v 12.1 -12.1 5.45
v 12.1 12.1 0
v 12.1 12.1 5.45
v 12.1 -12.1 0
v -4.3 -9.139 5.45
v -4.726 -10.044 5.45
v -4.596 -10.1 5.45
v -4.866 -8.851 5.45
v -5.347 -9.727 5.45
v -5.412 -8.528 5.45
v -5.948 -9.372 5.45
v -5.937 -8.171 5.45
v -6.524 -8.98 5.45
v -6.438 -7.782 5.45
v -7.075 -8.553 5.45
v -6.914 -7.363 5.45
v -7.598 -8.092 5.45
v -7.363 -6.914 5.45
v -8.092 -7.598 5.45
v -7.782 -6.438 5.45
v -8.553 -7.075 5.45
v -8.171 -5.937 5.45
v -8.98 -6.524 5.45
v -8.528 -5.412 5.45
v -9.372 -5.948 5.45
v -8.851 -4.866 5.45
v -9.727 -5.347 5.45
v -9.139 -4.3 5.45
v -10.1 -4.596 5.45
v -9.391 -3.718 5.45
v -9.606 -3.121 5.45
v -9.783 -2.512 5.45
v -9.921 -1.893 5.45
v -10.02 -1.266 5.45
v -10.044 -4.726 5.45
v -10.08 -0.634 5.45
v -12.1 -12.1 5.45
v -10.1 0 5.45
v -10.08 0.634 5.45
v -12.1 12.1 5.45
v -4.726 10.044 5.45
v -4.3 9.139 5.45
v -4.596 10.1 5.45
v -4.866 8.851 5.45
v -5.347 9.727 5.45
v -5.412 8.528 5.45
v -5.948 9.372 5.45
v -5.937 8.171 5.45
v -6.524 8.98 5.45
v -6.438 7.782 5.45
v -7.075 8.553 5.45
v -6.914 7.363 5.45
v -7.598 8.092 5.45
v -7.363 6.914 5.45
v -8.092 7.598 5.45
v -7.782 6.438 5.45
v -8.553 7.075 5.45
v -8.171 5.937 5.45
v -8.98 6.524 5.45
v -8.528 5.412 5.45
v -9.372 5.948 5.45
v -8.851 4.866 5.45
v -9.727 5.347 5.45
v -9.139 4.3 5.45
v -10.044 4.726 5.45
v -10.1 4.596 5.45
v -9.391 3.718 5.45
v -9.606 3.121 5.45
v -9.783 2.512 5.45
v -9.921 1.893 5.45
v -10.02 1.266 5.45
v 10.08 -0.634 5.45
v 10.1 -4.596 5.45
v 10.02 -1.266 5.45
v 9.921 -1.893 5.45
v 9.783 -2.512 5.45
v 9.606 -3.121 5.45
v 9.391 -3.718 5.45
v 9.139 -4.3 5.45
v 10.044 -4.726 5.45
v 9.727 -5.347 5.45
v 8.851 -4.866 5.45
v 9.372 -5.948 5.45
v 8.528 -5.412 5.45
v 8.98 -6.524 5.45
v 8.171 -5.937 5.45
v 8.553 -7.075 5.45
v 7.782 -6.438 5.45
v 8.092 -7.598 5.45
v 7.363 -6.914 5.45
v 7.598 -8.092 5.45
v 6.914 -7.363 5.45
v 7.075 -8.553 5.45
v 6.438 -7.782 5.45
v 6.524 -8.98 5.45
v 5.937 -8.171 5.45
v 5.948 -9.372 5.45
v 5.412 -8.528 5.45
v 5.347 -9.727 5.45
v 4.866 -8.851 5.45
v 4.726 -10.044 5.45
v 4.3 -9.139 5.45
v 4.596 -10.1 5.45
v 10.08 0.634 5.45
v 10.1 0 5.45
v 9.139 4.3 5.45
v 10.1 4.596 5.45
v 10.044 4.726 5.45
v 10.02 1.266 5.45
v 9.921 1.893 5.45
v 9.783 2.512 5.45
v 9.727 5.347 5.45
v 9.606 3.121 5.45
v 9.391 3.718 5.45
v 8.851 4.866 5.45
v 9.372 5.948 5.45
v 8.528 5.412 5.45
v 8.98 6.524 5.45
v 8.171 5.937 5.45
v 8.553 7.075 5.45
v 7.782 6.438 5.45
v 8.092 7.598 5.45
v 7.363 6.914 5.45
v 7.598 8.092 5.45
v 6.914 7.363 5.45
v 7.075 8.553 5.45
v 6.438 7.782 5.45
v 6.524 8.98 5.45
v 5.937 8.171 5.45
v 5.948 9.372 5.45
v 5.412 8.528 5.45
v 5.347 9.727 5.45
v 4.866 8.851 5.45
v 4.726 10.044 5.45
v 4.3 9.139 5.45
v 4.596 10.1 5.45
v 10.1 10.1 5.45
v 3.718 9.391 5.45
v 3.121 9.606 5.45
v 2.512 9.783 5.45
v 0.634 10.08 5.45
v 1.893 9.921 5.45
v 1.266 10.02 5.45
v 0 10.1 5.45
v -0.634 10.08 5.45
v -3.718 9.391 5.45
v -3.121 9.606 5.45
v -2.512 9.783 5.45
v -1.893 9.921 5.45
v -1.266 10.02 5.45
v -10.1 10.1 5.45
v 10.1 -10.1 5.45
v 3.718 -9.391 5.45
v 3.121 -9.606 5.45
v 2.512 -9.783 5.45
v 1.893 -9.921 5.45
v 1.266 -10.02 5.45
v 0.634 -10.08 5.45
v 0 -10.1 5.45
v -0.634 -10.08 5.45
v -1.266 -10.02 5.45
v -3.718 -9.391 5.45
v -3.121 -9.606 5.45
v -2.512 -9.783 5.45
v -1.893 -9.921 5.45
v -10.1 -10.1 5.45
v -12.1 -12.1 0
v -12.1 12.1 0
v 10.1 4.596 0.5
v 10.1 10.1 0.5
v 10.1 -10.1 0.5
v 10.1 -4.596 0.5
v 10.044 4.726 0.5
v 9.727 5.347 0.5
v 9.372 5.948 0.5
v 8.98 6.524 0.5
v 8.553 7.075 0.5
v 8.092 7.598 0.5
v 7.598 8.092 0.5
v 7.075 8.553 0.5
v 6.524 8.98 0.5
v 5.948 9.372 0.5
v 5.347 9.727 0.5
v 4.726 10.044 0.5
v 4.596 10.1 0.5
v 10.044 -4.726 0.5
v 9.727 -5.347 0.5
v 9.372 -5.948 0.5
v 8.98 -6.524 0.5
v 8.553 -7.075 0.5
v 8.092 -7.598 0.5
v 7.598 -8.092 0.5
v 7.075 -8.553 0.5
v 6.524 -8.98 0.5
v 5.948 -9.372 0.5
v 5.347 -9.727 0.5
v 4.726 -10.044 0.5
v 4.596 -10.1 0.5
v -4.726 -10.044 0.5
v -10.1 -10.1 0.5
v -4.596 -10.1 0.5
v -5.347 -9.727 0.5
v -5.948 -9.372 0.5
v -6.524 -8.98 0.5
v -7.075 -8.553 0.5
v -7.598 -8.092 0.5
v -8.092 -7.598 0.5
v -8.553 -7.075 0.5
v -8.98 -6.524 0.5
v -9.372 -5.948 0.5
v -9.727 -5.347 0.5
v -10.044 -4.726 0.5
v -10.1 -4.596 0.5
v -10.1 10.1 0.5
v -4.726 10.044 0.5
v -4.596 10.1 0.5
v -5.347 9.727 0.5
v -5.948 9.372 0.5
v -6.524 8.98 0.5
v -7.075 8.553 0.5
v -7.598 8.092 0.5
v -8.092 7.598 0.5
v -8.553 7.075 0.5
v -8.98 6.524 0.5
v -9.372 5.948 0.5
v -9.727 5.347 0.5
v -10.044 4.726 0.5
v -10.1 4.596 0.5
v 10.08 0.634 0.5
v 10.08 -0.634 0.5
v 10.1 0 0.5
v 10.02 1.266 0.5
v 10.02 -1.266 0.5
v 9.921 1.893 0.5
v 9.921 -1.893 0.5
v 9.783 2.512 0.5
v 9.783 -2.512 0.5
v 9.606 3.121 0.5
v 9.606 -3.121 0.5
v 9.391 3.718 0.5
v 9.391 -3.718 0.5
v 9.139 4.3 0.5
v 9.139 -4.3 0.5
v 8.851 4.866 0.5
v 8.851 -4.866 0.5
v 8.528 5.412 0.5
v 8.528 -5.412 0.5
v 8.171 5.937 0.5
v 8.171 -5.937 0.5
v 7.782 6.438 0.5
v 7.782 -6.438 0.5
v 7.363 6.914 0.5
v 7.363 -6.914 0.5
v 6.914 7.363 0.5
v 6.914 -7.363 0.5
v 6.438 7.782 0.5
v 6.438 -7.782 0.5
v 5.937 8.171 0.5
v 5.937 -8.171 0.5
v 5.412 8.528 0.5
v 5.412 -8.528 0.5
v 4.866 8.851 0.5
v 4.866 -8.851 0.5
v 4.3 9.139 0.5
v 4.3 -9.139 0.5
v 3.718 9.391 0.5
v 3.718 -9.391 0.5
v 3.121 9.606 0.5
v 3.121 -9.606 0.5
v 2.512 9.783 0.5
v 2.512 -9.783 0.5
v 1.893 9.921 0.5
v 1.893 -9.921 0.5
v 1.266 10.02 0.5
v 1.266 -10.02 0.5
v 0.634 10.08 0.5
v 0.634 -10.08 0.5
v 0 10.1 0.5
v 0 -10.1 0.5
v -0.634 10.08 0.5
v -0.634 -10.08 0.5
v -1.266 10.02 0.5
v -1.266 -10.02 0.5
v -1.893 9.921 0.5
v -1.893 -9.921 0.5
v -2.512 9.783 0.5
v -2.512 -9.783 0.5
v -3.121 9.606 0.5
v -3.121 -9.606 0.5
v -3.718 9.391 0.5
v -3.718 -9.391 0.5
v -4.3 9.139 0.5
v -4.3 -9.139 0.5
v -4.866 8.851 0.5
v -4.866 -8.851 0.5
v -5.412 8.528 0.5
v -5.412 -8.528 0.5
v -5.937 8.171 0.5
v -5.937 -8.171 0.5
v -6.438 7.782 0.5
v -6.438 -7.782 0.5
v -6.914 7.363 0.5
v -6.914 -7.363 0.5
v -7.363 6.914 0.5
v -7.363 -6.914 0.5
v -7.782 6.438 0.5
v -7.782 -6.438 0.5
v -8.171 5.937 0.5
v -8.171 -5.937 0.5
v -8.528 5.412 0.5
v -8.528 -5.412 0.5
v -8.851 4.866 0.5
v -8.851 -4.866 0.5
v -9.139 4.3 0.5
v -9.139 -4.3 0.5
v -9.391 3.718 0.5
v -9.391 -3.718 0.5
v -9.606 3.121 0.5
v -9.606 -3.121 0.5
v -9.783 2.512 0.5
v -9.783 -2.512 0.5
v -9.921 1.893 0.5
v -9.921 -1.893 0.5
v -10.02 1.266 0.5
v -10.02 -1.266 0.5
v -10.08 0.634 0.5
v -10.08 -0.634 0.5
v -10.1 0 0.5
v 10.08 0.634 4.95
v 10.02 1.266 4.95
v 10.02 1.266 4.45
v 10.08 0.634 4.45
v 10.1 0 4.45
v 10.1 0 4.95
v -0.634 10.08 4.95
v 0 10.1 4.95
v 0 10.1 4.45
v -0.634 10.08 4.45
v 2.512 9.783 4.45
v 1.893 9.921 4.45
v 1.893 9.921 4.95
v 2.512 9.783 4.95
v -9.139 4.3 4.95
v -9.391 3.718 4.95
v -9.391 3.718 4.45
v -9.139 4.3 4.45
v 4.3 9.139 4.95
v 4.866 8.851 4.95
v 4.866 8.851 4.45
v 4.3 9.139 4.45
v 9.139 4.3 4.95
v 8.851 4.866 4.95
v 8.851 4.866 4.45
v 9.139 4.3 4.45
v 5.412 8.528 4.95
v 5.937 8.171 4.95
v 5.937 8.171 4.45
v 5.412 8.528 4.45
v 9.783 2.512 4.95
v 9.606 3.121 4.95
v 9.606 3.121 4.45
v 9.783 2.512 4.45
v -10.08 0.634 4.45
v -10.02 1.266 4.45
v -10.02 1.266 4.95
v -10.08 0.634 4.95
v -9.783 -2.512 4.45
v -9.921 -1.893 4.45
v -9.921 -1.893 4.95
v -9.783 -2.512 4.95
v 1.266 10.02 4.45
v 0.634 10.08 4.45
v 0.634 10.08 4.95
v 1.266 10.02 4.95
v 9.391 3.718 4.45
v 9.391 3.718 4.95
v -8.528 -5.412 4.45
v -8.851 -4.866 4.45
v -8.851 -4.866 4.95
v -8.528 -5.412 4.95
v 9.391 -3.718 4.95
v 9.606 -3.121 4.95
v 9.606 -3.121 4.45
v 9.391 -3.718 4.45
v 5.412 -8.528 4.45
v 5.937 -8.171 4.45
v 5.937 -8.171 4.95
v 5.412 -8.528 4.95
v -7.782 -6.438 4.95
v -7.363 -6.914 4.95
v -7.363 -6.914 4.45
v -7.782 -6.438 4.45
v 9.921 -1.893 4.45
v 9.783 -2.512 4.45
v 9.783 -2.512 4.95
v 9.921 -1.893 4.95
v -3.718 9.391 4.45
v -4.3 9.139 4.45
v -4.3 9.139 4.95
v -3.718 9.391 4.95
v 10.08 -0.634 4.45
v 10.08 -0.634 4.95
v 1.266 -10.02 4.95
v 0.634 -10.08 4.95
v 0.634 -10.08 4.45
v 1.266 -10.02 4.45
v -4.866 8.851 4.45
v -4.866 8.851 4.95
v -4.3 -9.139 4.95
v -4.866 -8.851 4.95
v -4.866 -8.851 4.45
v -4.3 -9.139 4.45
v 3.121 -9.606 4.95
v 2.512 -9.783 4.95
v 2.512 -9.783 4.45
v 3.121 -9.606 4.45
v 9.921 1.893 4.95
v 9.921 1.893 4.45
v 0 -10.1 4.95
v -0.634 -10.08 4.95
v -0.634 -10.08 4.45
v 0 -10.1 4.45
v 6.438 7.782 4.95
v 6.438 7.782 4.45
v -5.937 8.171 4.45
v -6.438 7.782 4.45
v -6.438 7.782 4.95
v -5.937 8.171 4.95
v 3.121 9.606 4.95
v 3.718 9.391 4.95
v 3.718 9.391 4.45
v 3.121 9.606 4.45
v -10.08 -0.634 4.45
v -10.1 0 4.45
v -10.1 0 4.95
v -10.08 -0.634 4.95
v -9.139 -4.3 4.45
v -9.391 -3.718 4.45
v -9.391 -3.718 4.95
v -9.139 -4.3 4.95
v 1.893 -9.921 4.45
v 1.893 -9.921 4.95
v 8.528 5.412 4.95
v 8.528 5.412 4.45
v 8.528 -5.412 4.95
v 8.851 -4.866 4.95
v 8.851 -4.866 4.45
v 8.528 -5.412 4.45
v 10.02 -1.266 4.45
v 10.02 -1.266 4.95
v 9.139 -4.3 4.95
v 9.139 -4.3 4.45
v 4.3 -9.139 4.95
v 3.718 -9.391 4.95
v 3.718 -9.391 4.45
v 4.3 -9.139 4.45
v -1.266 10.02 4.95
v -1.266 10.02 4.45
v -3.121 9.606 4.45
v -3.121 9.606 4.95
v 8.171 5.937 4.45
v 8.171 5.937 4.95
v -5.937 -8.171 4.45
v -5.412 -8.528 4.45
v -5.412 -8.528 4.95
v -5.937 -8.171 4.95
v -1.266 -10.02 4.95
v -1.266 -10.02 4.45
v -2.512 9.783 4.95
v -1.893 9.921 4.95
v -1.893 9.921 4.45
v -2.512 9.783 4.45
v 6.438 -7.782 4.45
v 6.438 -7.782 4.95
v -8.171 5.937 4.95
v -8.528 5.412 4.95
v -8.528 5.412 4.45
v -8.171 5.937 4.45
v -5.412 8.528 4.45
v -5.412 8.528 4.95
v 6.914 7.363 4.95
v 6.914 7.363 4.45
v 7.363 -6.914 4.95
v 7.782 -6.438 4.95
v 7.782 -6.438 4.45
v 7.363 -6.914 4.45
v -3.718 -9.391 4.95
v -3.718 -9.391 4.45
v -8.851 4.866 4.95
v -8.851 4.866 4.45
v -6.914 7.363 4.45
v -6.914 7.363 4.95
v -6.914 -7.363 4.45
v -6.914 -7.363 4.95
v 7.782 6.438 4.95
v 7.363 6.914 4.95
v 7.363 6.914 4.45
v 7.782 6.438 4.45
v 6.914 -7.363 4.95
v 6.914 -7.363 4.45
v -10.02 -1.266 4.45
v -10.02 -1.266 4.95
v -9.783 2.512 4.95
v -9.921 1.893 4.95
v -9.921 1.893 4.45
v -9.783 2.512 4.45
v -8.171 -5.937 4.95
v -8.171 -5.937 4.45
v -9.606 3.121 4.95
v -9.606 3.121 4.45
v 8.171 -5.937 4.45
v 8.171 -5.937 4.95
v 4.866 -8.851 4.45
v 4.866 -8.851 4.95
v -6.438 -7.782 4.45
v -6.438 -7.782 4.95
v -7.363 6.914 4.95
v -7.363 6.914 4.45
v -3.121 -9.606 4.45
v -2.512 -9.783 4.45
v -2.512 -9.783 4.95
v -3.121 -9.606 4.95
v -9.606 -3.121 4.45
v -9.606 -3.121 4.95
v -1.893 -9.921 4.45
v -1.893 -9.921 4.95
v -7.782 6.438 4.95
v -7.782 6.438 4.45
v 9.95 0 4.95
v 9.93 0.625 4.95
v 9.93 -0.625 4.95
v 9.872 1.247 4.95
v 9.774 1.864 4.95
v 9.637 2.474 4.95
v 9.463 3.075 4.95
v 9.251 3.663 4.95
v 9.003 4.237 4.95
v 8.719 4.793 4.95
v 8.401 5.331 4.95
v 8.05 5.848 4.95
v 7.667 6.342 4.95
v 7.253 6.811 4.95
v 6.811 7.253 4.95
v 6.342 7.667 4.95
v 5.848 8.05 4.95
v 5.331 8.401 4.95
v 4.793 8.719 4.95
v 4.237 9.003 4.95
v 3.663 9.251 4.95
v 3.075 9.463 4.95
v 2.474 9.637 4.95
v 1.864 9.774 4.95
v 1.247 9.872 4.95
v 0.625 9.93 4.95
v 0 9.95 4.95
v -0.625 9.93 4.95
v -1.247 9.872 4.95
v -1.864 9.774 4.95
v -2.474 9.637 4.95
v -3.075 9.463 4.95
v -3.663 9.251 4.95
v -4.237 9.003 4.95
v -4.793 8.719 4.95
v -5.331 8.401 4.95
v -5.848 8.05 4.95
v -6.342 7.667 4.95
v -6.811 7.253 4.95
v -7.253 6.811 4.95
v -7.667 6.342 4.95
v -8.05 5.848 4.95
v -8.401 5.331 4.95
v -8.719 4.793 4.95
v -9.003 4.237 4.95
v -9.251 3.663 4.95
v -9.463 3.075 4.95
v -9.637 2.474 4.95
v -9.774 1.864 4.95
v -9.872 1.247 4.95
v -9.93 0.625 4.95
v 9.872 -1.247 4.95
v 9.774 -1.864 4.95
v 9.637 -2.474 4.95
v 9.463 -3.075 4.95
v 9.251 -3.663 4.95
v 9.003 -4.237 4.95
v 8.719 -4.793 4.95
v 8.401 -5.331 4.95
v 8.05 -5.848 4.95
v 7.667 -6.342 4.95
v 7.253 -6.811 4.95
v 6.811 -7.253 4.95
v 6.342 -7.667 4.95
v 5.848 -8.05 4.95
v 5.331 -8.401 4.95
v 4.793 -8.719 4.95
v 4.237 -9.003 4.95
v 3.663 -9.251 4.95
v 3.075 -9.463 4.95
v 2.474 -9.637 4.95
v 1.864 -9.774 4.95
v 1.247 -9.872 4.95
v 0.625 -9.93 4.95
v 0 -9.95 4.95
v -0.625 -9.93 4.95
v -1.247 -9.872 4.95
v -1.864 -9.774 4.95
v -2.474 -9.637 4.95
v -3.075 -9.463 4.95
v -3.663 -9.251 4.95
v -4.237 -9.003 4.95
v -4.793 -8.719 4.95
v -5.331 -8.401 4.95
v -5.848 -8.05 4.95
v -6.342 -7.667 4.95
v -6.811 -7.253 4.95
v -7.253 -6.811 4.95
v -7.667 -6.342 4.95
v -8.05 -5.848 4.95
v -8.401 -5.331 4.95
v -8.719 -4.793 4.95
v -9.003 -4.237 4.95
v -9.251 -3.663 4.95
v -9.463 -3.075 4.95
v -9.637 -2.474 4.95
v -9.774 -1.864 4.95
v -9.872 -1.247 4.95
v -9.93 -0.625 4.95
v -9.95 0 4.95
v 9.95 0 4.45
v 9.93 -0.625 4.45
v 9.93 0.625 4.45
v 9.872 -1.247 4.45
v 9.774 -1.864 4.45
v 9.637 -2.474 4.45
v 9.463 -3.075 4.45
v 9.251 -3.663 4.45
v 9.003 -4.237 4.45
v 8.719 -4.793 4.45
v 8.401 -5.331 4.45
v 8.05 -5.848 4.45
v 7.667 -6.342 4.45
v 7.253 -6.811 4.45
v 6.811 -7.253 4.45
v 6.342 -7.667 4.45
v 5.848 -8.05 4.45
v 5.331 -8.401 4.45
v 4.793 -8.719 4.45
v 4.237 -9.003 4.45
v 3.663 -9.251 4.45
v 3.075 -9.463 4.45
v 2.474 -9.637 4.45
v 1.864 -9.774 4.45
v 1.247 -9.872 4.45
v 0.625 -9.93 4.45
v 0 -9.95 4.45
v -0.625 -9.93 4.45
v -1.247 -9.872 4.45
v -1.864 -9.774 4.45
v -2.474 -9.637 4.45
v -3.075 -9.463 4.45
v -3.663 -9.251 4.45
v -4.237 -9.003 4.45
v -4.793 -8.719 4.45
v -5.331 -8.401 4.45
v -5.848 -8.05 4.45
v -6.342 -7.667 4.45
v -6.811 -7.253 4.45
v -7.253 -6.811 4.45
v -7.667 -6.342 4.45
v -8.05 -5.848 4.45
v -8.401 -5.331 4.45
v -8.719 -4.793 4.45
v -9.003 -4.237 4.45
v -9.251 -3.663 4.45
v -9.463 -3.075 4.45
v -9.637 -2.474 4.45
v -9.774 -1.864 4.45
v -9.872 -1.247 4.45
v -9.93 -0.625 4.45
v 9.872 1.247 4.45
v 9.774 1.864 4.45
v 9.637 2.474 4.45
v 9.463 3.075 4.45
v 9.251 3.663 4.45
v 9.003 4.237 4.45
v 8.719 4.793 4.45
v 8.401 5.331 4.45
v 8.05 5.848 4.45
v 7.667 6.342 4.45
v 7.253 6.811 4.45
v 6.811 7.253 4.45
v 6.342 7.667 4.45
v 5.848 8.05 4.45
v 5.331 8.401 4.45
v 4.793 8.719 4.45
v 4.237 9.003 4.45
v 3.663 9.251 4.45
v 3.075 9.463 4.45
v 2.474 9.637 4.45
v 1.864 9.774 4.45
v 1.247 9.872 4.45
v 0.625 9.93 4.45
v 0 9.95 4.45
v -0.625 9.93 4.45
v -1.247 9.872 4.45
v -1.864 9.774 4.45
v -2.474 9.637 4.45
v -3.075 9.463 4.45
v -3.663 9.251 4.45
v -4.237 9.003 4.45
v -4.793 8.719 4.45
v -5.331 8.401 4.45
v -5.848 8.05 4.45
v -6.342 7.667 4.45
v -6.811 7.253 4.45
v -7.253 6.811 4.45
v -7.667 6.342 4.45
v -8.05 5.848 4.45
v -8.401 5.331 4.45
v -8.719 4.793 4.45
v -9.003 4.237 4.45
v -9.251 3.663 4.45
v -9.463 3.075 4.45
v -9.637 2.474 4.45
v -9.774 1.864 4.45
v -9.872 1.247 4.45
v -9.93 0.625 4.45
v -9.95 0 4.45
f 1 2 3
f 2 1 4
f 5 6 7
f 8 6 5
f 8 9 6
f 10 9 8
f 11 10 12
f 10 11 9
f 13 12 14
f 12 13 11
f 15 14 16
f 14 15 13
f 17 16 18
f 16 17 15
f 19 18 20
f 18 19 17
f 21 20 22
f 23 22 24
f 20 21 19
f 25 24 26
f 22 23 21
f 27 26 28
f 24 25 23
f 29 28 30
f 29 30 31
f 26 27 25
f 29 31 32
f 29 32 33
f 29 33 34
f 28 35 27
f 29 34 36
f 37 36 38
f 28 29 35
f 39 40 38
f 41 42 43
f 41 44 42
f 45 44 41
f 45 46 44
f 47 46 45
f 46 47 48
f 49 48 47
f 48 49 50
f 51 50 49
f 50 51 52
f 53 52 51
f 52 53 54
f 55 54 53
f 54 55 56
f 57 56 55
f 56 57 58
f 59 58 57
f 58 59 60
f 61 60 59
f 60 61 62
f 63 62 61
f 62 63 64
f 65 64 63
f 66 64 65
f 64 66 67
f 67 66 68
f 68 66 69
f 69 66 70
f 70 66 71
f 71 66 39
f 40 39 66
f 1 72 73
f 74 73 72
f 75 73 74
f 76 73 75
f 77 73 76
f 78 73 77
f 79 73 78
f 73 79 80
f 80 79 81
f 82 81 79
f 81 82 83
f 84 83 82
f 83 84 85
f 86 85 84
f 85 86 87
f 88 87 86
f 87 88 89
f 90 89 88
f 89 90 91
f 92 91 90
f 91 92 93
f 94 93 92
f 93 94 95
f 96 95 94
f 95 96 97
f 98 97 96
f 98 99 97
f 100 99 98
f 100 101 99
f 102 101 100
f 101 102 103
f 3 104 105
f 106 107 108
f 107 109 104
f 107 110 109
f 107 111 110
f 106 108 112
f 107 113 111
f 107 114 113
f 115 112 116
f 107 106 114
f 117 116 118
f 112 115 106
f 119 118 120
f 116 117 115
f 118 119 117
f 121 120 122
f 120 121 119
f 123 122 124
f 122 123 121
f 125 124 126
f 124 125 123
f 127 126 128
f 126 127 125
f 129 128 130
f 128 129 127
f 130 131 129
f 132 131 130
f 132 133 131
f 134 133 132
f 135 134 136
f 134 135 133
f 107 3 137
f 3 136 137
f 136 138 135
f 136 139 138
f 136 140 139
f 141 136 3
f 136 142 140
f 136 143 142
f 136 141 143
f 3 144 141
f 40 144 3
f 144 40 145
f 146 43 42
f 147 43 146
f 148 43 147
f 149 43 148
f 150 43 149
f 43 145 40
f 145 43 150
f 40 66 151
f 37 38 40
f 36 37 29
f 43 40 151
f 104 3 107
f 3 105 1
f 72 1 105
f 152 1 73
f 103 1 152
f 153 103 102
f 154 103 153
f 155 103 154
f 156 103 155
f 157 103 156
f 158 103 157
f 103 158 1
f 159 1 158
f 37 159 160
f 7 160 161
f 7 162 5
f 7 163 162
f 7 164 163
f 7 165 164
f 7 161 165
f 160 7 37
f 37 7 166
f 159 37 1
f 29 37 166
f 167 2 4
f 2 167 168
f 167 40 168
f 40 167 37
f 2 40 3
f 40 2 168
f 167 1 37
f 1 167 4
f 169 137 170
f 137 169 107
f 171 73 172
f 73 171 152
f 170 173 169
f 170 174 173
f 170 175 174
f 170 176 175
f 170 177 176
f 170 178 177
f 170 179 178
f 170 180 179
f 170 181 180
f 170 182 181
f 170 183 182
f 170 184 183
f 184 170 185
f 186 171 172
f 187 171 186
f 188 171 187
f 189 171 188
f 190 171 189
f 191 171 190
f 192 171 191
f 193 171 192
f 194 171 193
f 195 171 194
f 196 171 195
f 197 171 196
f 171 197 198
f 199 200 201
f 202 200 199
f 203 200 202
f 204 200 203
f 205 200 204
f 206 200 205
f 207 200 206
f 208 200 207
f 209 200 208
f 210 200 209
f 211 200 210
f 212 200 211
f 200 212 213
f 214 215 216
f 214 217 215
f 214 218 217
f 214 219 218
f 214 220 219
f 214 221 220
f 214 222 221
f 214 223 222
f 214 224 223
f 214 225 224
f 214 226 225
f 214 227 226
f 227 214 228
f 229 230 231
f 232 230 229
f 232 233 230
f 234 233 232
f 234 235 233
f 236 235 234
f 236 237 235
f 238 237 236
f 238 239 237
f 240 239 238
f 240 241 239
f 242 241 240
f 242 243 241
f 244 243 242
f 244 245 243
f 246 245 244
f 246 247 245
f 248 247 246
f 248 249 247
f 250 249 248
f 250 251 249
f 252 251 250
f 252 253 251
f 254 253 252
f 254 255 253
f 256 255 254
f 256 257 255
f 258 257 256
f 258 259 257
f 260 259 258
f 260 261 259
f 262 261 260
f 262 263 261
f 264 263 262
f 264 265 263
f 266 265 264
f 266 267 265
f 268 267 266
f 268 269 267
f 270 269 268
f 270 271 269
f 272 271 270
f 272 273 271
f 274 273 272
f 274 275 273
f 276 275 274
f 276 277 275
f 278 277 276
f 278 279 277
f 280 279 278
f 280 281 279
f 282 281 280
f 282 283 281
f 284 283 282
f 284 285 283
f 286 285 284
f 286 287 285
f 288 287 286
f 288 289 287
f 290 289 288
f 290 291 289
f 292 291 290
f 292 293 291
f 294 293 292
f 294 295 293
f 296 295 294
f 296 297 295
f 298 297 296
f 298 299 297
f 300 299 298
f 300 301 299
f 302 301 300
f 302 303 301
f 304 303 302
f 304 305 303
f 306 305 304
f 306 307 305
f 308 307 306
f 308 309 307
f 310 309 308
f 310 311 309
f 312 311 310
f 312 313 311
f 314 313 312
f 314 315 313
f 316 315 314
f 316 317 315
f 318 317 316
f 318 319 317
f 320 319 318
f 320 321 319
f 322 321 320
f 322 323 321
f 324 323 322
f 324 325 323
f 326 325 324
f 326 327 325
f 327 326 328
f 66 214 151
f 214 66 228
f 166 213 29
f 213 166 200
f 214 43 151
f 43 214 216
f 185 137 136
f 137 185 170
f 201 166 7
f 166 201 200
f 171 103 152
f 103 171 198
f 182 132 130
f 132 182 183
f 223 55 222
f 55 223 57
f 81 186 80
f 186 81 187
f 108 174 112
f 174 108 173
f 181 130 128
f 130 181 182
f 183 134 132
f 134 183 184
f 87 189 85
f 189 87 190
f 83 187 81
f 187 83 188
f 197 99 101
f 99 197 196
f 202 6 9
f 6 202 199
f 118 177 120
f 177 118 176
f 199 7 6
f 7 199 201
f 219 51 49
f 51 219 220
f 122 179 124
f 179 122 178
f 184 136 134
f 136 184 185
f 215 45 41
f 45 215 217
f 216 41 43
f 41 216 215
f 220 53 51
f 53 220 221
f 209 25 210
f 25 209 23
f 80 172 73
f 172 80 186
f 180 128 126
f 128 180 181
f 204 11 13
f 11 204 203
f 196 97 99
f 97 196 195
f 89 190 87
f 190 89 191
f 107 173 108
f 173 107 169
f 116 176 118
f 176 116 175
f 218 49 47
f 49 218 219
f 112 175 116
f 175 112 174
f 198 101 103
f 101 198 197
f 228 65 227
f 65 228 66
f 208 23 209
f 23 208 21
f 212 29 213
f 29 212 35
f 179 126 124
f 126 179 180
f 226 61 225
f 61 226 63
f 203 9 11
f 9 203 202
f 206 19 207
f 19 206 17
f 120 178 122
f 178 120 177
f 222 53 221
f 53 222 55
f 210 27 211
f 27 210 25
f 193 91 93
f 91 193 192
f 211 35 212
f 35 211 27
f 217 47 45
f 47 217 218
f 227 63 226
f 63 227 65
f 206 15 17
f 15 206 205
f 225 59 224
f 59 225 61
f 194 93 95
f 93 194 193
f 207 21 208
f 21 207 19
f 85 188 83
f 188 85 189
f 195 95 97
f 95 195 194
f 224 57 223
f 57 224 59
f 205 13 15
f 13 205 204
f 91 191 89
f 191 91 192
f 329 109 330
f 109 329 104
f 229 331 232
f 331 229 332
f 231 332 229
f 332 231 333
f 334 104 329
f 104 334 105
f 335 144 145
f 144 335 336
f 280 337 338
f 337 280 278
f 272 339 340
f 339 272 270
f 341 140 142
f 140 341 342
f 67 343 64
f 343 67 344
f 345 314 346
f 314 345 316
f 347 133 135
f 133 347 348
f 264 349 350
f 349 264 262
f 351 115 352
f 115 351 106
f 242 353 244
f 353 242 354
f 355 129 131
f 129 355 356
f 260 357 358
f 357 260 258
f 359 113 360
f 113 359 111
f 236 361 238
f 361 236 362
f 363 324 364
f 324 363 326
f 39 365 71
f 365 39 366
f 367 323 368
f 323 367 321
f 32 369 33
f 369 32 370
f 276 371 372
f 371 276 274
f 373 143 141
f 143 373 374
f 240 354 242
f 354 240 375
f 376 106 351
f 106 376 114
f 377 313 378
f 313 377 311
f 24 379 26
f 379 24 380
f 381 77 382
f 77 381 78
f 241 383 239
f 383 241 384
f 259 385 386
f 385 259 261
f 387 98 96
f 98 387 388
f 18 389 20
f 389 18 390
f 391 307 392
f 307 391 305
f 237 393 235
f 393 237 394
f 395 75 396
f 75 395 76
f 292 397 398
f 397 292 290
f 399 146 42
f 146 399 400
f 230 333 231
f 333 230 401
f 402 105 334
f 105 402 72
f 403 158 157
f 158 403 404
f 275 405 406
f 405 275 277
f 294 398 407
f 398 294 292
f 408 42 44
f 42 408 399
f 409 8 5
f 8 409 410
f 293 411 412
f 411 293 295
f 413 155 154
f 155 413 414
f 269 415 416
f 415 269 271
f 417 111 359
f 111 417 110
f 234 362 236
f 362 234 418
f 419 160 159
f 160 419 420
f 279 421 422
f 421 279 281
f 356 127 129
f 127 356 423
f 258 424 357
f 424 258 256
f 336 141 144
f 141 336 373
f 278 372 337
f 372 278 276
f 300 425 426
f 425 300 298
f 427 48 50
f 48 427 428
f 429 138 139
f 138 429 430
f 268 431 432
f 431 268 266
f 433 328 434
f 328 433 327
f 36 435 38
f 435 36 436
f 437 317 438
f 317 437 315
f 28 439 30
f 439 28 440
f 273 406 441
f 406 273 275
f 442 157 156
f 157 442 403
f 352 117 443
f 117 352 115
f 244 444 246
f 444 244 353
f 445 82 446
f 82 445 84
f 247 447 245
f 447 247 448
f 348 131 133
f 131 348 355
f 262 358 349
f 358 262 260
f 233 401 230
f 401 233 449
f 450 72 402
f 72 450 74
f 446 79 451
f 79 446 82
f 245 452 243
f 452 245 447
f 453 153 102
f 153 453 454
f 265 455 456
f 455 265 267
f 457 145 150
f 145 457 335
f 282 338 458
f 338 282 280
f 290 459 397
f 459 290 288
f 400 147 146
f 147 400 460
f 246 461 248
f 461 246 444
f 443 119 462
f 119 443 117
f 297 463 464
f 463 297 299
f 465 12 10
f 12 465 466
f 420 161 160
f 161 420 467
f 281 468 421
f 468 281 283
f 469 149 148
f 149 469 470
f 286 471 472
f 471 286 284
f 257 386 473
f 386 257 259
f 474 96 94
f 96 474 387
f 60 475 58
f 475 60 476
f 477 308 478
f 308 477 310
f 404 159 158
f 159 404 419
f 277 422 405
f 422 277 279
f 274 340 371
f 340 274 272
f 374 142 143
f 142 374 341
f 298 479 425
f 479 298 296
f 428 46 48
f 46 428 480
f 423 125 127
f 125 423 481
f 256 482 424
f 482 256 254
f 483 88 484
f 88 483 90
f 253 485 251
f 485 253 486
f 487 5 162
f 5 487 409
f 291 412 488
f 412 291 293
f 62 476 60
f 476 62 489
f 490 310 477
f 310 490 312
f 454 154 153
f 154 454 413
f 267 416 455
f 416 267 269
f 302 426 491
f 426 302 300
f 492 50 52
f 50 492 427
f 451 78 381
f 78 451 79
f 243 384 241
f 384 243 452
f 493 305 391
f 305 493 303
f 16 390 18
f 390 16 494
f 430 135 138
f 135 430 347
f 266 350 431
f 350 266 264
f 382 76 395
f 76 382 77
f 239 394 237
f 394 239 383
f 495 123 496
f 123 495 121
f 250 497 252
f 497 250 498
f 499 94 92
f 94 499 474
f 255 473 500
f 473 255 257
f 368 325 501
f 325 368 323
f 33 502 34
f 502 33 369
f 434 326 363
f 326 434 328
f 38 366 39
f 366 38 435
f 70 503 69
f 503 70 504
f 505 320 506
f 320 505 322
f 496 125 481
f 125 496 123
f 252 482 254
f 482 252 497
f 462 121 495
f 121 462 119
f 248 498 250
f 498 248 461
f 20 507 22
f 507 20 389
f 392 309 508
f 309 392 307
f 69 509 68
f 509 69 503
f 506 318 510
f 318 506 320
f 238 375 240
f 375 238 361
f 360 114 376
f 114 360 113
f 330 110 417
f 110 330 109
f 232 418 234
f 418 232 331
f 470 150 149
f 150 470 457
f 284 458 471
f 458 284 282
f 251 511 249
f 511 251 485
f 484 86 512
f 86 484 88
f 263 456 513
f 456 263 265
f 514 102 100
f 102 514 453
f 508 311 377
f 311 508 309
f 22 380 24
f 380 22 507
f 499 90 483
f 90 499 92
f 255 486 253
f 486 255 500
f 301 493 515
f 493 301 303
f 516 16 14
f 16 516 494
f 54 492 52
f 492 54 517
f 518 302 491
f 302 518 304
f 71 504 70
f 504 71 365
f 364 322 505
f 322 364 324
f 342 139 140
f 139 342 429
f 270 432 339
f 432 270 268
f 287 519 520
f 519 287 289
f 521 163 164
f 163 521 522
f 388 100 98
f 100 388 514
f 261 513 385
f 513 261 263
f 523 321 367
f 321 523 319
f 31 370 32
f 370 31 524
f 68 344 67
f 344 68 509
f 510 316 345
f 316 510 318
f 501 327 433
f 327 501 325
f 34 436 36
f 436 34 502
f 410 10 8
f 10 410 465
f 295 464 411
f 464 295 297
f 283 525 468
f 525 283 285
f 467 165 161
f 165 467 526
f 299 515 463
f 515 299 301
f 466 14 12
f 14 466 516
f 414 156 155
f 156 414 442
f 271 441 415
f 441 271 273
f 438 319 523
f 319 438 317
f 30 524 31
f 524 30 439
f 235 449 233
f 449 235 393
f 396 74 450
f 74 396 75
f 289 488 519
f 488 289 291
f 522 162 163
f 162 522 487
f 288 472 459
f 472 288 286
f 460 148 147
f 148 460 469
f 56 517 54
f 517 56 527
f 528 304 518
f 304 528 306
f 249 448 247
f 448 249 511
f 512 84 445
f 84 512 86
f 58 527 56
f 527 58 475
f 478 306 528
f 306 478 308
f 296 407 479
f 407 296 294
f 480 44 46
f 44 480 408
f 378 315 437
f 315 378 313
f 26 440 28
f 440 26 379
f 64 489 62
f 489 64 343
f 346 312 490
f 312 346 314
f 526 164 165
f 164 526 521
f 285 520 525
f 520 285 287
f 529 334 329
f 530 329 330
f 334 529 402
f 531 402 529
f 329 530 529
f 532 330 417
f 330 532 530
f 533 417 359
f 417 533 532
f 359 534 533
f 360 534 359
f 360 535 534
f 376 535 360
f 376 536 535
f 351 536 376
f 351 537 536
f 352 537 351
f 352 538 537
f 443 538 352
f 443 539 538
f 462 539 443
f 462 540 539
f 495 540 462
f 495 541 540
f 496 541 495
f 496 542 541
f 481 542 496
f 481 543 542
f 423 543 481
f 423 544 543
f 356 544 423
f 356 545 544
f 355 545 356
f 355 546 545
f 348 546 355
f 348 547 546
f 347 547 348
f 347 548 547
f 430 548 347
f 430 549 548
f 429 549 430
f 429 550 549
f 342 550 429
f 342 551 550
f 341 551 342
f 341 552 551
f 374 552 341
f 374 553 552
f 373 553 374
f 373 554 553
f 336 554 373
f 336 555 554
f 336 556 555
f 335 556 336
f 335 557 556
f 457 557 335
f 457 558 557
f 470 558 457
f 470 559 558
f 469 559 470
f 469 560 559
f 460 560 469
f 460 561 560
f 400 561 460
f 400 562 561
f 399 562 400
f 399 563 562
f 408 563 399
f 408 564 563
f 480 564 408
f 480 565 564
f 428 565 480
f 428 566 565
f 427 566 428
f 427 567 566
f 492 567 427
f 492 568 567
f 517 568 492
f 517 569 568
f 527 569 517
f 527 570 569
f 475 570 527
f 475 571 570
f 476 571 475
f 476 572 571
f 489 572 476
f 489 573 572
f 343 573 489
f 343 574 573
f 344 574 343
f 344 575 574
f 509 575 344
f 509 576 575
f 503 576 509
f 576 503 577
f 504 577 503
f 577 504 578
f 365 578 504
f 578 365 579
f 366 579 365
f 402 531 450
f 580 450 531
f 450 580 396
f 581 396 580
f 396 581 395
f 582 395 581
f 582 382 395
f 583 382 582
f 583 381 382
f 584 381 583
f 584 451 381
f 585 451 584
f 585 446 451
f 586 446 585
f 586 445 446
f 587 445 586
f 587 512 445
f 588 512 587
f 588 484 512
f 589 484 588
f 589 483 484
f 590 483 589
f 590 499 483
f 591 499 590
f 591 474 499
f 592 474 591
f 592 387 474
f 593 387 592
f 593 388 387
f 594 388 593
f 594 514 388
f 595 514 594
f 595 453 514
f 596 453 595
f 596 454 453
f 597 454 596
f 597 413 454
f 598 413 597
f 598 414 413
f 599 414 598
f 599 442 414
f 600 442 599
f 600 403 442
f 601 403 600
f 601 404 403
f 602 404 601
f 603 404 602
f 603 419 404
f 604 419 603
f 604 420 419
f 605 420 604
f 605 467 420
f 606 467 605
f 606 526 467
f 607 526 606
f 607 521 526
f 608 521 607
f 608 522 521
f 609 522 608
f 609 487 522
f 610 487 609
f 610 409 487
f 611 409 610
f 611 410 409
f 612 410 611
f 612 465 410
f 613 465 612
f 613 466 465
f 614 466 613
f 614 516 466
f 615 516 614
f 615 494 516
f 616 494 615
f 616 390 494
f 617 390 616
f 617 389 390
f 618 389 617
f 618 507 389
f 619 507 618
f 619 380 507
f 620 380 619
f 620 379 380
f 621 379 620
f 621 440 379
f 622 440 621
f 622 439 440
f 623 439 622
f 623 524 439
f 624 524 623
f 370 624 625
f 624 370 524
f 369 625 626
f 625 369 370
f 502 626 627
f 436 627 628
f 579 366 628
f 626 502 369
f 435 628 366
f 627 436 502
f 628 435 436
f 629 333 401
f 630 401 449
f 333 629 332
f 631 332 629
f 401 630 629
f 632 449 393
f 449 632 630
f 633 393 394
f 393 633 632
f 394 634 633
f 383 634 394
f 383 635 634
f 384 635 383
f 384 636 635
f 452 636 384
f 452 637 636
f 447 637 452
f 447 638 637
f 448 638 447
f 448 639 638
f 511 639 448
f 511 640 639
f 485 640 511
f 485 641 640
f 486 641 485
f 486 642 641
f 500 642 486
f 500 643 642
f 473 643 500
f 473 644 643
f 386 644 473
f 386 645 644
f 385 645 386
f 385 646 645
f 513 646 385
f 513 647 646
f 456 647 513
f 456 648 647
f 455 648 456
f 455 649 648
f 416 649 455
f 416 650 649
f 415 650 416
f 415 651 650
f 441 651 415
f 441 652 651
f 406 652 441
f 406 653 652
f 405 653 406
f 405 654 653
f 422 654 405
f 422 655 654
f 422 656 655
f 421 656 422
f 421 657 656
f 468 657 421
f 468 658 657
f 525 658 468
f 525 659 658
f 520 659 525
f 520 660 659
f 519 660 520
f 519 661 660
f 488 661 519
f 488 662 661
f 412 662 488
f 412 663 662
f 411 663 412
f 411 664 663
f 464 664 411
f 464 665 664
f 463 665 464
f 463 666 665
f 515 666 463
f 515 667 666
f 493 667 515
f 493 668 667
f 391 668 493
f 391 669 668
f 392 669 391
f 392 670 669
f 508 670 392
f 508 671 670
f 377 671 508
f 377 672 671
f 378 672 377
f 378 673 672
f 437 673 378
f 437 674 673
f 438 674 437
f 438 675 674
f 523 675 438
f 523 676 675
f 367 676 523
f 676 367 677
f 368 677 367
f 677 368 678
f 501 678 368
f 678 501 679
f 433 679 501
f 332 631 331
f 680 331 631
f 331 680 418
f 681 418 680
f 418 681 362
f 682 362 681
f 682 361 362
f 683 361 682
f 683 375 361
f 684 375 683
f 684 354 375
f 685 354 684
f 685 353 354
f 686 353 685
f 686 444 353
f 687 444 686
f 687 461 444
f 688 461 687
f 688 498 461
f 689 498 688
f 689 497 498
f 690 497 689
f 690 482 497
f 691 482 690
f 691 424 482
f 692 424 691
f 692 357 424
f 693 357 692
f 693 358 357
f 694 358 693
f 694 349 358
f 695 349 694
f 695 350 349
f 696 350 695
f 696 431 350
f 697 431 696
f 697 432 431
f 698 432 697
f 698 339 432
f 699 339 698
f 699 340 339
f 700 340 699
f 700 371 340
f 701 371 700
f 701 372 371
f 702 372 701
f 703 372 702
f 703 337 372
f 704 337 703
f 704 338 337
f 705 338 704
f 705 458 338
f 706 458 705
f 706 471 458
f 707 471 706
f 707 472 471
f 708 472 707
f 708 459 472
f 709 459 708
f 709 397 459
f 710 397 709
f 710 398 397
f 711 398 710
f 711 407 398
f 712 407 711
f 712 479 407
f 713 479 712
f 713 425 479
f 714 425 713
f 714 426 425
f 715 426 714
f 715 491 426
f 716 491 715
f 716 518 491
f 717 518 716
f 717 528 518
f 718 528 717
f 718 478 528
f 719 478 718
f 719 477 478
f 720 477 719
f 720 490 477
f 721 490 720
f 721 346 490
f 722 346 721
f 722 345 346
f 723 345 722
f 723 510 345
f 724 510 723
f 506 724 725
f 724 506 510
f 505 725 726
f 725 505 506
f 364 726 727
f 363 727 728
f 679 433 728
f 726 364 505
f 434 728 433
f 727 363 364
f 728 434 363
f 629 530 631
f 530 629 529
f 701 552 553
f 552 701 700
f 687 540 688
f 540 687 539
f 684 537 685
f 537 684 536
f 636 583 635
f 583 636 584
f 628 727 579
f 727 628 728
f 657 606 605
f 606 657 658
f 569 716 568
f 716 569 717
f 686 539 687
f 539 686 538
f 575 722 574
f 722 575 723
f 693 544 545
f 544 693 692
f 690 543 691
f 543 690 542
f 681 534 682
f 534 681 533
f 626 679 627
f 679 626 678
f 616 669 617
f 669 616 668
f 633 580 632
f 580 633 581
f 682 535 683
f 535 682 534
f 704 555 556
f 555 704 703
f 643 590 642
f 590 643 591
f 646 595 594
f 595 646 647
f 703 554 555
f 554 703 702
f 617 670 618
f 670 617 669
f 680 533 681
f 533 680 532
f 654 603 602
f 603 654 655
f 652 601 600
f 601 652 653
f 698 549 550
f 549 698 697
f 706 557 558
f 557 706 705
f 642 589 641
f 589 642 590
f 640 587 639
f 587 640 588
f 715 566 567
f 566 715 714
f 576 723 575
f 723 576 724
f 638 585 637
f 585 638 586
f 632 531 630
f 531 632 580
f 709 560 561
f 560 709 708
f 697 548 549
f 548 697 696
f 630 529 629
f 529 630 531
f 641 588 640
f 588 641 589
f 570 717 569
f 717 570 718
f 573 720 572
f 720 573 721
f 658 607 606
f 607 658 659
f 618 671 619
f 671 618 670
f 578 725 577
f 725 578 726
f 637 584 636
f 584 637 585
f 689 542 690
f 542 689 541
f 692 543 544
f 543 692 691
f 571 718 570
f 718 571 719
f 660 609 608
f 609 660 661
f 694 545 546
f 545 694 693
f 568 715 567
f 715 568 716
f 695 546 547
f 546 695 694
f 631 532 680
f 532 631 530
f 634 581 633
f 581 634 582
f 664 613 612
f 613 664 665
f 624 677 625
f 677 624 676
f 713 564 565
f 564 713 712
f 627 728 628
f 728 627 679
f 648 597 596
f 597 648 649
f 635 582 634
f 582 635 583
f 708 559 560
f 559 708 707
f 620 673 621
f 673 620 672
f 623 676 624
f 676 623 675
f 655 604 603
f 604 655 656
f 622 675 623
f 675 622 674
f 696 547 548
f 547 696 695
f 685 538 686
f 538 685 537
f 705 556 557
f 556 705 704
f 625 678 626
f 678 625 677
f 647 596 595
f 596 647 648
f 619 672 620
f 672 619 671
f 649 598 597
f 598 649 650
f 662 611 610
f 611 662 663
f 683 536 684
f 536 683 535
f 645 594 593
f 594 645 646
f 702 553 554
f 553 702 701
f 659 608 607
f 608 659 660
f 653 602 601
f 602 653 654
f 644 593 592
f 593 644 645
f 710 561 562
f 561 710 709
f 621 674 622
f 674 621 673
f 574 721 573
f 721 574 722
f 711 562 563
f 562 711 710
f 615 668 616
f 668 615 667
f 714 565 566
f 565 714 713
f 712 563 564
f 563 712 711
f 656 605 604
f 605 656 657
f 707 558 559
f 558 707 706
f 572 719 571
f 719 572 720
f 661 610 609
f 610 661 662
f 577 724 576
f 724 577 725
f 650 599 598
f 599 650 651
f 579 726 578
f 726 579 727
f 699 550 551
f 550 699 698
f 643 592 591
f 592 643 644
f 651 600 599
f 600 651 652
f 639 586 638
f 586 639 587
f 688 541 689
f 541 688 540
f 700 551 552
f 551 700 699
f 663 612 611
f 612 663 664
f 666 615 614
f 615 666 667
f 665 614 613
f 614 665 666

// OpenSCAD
/*
 * Magnetic holder generator
 * (c) 2020 David Mikulik
 * Licensed under 
 *   Creative Commons 
 *   Attribution Non Comercial Share alike license
 */
 
$fn=100;


THIKNES=2;
TOP_THIKNES=0.5;

MAGNET_DIAMETER = 20.2;
MAGNET_HEIGHT = 4.95;// TWO 9.87;//

MAGNET_COUNT=1;

WITH_RECTANGLE_COVER=1;
WITH_ROUND_CAP=0;
WITH_ROUND_CAP_HOLE=0;
WITH_ROUND_CAP_IMAGE=0;
ROUND_CAP_IMAGE="piseksmall.png";



if (WITH_RECTANGLE_COVER)
    rectangleCover();
for (i=[0:1:MAGNET_COUNT-1]) {
    translate ([(MAGNET_DIAMETER+THIKNES)*i,0,0]) {
    if (WITH_ROUND_CAP)
        magnetroundcap ();
    magnetHolder();
    }
}

module rectangleCover() {
    translate ([-MAGNET_DIAMETER/2-THIKNES,-MAGNET_DIAMETER/2-THIKNES,0]) {
        difference () {
            cube ([(MAGNET_DIAMETER*(MAGNET_COUNT))+(MAGNET_COUNT>1?(THIKNES*MAGNET_COUNT+THIKNES):THIKNES*2),MAGNET_DIAMETER+THIKNES*2,MAGNET_HEIGHT+TOP_THIKNES]);
            translate ([THIKNES,THIKNES,TOP_THIKNES])
            cube ([MAGNET_DIAMETER*(MAGNET_COUNT)+(MAGNET_COUNT>1?THIKNES*MAGNET_COUNT-THIKNES:0),MAGNET_DIAMETER,MAGNET_HEIGHT]);

        }
    }
}
module magnetHolder() {
    translate([0,0,TOP_THIKNES]) {
        difference() 
        {
            cylinder (d=MAGNET_DIAMETER+THIKNES,h=MAGNET_HEIGHT);
            cylinder (d=MAGNET_DIAMETER,h=MAGNET_HEIGHT);
        }
        translate([0,0,MAGNET_HEIGHT-1]) {
            difference() 
            {
                cylinder (d=MAGNET_DIAMETER,h=0.5);
                cylinder (d=MAGNET_DIAMETER-0.3,h=0.5);
            }         
        }
    }
}

module magnetroundcap () {
        difference() 
    {
        cylinder (d=MAGNET_DIAMETER+THIKNES*4,h=TOP_THIKNES);
        if (WITH_ROUND_CAP_HOLE)
            cylinder (d=10,h=TOP_THIKNES);
        if (WITH_ROUND_CAP_IMAGE) {
            translate ([-MAGNET_DIAMETER/2,MAGNET_DIAMETER/2,-1]) {
            rotate ([180,0,0]) {
                scale([.1,.1,.02]) {
                    surface(file=ROUND_CAP_IMAGE,invert=true);
                }
            }  
          }
      }
    }

}
